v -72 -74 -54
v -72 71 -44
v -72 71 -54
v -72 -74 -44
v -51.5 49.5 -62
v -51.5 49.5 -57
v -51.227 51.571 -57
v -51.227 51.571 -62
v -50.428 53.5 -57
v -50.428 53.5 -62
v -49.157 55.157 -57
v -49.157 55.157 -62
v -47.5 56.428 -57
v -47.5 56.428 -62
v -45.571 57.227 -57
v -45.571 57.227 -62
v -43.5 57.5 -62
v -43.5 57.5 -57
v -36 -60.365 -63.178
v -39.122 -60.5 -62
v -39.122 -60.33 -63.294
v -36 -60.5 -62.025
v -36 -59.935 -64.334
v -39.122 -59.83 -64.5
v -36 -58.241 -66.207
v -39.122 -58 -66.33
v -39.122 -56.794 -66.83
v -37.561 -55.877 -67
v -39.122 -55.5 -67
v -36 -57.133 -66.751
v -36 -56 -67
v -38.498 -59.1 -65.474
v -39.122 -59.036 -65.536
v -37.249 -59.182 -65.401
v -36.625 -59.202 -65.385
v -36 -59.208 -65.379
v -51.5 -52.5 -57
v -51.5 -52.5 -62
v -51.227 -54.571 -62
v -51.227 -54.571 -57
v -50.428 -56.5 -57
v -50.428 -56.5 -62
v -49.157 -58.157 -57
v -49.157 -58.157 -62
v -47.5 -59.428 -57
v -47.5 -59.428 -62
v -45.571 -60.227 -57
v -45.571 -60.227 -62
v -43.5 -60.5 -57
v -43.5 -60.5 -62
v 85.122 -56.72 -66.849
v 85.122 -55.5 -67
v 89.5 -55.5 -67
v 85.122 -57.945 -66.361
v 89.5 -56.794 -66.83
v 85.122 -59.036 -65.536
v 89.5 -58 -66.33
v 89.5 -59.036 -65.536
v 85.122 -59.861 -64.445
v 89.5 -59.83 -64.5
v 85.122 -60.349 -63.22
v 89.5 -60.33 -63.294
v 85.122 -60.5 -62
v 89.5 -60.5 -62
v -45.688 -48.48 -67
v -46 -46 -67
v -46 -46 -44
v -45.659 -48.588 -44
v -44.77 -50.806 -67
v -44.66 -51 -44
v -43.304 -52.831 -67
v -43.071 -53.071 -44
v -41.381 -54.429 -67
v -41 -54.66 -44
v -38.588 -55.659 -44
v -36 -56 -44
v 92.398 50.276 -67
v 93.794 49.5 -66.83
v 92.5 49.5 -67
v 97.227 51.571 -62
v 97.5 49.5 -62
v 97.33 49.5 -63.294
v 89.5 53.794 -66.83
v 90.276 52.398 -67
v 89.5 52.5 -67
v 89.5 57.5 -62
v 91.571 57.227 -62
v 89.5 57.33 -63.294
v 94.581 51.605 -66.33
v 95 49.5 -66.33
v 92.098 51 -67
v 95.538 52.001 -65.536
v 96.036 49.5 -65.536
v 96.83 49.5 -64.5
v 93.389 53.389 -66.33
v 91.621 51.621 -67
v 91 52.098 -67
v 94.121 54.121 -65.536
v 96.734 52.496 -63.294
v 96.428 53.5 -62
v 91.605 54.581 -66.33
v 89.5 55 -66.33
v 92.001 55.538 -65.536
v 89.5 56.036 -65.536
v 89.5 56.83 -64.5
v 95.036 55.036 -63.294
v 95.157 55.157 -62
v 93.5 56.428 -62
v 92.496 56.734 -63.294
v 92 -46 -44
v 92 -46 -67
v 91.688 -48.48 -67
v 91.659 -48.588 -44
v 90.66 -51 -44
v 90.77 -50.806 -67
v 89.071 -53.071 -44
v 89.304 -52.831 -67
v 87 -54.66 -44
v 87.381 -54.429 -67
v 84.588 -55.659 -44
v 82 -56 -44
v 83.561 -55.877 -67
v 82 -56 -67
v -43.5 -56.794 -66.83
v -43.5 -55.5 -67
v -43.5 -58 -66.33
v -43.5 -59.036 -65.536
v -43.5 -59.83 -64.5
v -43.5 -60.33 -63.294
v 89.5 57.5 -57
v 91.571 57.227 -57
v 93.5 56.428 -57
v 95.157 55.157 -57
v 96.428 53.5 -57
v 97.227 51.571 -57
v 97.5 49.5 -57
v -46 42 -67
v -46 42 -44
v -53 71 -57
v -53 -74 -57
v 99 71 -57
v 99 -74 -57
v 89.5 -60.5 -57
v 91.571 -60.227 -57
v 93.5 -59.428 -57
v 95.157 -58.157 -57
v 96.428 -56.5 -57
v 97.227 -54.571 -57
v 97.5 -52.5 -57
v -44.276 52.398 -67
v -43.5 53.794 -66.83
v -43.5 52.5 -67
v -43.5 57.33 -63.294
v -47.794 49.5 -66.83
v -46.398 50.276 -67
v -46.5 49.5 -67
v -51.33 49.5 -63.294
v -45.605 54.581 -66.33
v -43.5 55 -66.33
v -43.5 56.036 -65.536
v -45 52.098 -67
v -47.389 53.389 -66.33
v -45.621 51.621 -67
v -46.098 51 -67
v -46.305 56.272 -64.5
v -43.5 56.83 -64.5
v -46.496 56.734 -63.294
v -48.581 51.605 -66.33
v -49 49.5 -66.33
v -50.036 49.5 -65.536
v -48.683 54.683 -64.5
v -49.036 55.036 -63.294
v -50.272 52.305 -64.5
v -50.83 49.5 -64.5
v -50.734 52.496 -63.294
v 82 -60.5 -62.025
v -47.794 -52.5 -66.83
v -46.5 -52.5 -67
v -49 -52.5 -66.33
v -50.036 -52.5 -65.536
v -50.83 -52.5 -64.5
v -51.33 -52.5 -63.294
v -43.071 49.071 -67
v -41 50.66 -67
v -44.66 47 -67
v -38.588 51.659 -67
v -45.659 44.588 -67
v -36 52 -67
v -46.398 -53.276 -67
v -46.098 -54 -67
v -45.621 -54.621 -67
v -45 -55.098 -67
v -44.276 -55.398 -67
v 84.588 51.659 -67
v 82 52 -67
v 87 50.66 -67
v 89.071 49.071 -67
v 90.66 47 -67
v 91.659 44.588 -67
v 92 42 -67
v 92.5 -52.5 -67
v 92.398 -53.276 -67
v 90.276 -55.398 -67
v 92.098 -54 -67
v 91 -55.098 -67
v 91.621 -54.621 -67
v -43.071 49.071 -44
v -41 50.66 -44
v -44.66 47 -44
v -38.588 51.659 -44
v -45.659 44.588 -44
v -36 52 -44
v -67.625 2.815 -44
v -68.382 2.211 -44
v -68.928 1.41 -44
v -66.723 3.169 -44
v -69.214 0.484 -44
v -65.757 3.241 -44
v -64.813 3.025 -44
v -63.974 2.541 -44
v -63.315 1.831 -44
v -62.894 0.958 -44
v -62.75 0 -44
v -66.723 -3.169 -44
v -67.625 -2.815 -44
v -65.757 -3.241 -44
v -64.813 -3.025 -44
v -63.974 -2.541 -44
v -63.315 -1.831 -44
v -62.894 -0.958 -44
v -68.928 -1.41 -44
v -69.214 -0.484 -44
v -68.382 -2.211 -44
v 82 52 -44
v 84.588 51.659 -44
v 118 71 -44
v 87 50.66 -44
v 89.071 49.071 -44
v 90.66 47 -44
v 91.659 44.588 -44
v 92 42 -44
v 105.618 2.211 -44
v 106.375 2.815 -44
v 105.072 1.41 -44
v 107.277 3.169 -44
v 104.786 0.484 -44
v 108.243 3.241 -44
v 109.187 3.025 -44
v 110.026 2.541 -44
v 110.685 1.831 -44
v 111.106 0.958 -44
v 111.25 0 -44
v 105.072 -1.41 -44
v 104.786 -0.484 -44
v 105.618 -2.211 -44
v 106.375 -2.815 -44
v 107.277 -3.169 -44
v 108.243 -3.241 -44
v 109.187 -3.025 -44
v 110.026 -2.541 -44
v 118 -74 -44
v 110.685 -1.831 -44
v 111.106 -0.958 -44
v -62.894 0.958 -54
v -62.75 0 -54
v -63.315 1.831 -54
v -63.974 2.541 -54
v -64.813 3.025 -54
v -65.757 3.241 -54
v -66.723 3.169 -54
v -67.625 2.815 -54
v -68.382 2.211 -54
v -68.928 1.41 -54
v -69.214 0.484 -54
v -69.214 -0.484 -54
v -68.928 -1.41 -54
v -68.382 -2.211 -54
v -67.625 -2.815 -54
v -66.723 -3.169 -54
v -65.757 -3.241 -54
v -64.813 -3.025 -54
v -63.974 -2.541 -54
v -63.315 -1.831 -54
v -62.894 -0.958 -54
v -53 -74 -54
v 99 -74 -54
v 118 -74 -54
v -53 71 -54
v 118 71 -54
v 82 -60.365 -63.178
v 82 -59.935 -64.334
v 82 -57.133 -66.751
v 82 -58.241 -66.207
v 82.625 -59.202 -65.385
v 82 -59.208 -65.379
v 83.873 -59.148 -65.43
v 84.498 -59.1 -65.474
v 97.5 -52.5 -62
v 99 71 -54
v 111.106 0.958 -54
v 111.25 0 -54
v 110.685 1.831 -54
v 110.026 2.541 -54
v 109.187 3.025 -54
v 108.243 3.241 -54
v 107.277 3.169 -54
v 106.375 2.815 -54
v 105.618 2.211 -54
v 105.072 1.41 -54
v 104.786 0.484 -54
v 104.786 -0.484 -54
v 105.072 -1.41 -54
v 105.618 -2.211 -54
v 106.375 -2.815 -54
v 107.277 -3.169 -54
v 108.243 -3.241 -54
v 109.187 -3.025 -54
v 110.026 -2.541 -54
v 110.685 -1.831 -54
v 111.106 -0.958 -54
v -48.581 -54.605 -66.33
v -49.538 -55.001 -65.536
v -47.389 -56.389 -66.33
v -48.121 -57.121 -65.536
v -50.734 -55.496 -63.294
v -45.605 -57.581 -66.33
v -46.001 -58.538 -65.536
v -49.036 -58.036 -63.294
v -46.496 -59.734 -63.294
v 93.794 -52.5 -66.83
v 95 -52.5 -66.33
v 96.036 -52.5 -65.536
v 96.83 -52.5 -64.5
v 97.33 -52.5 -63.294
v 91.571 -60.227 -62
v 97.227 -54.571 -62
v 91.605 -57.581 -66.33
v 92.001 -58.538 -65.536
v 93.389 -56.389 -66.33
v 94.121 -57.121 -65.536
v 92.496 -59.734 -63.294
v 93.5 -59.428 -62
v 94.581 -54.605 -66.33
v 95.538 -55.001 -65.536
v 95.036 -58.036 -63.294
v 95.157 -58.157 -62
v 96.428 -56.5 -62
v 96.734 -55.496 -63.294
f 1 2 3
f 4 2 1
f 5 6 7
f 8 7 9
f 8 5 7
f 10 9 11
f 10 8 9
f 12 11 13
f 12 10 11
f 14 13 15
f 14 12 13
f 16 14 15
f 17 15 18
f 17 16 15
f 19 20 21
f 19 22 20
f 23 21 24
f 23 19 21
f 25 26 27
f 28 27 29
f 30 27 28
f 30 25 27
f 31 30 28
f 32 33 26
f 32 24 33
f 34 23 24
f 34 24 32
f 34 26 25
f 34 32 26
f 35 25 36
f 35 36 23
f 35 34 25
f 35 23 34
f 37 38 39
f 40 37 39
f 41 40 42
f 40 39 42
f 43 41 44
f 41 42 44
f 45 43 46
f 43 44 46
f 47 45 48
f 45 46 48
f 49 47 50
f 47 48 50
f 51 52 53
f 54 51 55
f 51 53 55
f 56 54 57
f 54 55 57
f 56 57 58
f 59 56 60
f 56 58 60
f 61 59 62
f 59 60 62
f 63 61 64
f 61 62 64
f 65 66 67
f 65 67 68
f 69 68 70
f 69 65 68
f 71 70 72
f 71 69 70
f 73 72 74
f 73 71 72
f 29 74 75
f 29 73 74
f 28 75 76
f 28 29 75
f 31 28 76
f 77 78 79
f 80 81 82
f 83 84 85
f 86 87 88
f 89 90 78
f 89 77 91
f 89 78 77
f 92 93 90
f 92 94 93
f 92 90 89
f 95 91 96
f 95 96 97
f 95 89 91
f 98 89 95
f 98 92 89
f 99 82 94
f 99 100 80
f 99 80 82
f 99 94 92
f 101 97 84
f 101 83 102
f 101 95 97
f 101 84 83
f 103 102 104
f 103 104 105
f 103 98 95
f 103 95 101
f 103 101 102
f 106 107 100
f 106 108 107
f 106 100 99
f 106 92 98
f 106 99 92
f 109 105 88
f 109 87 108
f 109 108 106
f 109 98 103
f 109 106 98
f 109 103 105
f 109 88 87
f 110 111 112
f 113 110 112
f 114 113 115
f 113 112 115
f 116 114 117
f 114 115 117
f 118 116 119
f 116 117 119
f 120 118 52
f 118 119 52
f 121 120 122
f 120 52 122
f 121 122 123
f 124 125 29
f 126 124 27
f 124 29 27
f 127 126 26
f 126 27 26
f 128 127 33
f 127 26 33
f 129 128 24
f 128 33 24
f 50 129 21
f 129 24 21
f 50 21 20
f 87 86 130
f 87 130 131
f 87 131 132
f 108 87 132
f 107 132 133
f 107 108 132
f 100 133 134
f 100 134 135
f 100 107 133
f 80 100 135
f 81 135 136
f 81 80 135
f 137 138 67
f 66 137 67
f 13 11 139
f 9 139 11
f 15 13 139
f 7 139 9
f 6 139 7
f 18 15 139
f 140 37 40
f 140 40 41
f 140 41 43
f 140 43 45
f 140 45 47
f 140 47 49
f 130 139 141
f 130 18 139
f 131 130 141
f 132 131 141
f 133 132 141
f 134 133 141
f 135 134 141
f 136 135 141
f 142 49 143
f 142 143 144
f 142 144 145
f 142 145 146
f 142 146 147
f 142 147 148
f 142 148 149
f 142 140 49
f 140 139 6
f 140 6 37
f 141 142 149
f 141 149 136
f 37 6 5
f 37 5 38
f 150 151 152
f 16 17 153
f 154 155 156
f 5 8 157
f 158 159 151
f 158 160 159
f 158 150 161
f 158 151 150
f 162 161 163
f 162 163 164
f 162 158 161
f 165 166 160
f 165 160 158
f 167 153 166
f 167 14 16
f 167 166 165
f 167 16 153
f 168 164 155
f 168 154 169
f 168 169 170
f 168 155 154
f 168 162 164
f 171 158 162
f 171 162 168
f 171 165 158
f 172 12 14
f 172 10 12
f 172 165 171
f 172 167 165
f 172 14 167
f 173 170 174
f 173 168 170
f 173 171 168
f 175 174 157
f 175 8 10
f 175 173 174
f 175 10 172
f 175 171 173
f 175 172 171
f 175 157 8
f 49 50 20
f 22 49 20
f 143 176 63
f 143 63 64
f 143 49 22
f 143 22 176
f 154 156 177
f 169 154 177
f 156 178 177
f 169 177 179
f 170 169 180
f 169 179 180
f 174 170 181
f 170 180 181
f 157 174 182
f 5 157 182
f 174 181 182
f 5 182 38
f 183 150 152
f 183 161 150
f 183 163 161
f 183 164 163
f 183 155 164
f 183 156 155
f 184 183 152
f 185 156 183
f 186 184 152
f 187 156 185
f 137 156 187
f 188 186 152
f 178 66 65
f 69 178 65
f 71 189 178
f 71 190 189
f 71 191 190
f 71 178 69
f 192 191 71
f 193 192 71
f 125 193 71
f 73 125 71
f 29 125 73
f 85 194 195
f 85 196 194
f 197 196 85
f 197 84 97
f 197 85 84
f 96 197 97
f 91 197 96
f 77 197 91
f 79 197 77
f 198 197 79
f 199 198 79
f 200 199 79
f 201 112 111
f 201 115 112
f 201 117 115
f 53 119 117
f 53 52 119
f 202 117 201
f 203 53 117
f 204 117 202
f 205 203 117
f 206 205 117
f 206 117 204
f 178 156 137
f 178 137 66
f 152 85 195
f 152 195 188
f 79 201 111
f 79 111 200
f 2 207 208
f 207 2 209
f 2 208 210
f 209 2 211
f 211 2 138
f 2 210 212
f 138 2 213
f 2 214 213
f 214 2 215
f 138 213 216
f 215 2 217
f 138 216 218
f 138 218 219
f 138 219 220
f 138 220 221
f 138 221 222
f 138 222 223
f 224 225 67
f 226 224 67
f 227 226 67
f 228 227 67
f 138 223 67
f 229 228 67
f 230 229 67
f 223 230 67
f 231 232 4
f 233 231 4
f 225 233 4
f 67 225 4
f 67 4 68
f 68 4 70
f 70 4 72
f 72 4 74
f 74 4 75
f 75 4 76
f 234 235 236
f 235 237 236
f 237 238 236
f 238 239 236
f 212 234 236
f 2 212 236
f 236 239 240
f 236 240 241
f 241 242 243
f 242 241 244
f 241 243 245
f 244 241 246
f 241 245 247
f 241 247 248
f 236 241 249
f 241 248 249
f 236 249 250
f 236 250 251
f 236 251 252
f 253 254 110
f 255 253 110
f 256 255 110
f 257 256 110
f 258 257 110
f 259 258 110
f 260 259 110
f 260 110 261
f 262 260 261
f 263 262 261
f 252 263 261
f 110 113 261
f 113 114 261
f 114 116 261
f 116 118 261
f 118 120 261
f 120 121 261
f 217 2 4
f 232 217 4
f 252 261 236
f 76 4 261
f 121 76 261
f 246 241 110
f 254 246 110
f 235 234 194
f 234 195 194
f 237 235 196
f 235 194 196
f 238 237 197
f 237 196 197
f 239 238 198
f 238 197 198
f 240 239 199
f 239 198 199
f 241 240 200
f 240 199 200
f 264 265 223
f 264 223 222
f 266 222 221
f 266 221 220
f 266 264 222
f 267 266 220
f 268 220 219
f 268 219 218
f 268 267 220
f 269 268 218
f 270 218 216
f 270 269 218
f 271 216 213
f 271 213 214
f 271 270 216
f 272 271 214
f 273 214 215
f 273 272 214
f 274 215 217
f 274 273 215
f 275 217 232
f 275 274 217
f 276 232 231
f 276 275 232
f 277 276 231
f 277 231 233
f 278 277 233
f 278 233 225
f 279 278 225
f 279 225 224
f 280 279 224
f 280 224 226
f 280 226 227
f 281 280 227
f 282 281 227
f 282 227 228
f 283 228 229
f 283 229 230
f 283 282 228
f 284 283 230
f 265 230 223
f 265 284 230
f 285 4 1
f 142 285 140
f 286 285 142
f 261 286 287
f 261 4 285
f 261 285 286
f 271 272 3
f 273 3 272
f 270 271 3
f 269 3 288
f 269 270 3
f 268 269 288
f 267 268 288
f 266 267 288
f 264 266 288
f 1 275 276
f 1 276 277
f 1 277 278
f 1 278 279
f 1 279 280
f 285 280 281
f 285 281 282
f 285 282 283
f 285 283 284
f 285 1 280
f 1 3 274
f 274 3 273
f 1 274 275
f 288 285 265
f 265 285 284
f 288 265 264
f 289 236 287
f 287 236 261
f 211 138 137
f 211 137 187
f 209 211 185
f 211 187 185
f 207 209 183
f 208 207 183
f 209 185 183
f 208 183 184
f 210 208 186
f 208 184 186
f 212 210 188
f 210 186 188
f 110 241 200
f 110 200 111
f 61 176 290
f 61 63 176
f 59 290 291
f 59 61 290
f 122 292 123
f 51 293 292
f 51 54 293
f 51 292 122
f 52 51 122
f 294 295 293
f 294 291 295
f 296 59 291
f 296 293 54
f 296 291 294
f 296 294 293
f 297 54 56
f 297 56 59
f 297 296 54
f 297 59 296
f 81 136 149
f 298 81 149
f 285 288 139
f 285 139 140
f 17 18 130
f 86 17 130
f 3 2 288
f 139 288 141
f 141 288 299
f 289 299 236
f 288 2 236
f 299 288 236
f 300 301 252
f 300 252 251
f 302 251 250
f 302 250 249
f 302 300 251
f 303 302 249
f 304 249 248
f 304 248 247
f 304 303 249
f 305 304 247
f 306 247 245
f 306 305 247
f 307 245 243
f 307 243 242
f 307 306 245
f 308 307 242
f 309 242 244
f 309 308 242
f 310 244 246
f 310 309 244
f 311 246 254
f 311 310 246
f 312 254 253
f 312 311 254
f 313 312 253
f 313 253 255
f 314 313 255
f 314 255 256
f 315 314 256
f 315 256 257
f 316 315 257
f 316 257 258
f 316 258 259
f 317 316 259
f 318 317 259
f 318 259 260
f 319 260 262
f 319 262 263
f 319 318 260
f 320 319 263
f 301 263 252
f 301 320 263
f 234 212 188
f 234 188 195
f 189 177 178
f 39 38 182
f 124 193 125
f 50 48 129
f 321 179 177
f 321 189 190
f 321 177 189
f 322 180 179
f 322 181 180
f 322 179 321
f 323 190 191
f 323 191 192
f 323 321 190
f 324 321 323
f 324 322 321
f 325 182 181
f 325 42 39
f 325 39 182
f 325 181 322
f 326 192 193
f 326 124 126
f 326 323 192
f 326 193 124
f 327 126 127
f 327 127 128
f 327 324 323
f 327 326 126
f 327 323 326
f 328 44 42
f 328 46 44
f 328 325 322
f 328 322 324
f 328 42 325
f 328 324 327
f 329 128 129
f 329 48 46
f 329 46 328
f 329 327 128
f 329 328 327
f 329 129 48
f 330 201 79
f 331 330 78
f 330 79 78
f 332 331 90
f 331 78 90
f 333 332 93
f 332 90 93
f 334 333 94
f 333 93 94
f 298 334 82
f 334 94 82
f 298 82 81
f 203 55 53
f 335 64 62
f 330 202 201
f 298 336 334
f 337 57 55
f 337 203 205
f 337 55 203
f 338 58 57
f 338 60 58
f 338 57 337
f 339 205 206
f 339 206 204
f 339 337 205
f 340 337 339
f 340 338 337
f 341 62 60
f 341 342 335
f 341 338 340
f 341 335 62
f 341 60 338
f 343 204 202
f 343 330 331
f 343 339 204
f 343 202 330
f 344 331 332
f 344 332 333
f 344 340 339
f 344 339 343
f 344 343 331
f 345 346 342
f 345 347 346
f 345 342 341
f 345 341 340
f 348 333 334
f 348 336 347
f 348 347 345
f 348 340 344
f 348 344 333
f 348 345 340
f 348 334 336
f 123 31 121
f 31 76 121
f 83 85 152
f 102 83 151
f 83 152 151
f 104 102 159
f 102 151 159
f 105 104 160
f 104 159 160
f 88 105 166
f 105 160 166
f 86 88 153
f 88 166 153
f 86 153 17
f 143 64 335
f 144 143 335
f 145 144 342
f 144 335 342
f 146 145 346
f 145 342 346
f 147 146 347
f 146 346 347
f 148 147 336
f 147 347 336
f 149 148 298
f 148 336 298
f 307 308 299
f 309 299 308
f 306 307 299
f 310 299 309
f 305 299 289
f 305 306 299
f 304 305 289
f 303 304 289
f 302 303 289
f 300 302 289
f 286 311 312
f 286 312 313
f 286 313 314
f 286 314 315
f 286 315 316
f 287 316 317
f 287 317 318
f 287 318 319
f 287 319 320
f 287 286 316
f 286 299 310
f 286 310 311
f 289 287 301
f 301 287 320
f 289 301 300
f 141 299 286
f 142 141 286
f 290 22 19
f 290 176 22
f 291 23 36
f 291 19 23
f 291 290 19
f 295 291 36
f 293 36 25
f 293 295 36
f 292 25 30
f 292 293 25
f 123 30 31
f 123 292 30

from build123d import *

# Parameters (mm, degrees)
CYLINDER027_R             = 3.25
CYLINDER027_DEPTH         = 10
ARRAY009_X_COUNT          = 2
ARRAY009_X_PITCH          = 174
BOX051_W                  = 138
BOX051_H                  = 108
BOX051_DEPTH              = 37
BOX049_W                  = 152
BOX049_H                  = 145
BOX049_DEPTH              = 10
BOX048_W                  = 190
BOX048_H                  = 145
BOX048_DEPTH              = 10
BOX050_W                  = 149
BOX050_H                  = 118
BOX050_DEPTH              = 20
FILLET001_R               = 10
FILLET002_R               = 8
FILLET003_R               = 5
FILLET003_PLACEMENT_ANGLE = 180


with BuildPart() as array009:
    # Cylinder027 → Cylinder027 (new body)
    with BuildSketch(Plane(origin=(8, 75, 0), x_dir=(1, 0, 0), z_dir=(0, 0, 1))):
        Circle(CYLINDER027_R)
    extrude(amount=CYLINDER027_DEPTH)

    # Array009 X: Array009 ×2


with BuildPart() as array009_1:
    add(array009.part)
    with Locations(*[(i * ARRAY009_X_PITCH, 0, 0) for i in range(1, ARRAY009_X_COUNT)]):
        add(array009.part)


with BuildPart() as array009_2:
    # Array009 placement: moved
    add(array009_1.part.moved(Location((-74, -75, -54))))


with BuildPart() as cubo038:
    # Box051 → Box051 (new body)
    with BuildSketch(Plane(origin=(26, 19, -4), x_dir=(1, 0, 0), z_dir=(0, 0, 1))):
        with Locations((69, 54)):
            Rectangle(BOX051_W, BOX051_H)
    extrude(amount=BOX051_DEPTH)


with BuildPart() as cubo036:
    # Box049 → Box049 (new body)
    with BuildSketch(Plane(origin=(19, 0, 3), x_dir=(1, 0, 0), z_dir=(0, 0, 1))):
        with Locations((76, 72.5)):
            Rectangle(BOX049_W, BOX049_H)
    extrude(amount=BOX049_DEPTH)


with BuildPart() as cubo035:
    # Box048 → Box048 (new body)
    with BuildSketch(Plane.XY):
        with Locations((95, 72.5)):
            Rectangle(BOX048_W, BOX048_H)
    extrude(amount=BOX048_DEPTH)


with BuildPart() as cubeta_superior001:
    # Box050 → Box050 (new body)
    with BuildSketch(Plane(origin=(20.5, 13.5, 3), x_dir=(1, 0, 0), z_dir=(0, 0, 1))):
        with Locations((74.5, 59)):
            Rectangle(BOX050_W, BOX050_H)
    extrude(amount=BOX050_DEPTH)

    # Fusion026: union Cubo036, Cubo035
    add(cubo036.part)
    add(cubo035.part)

    # Cut035: cut Cubo038
    add(cubo038.part, mode=Mode.SUBTRACT)

    # Fillet001
    fillet001_edges = [cubeta_superior001.edges().sort_by_distance(p)[0] for p in [
        (164, 19, 11.5),
        (26, 19, 11.5),
        (164, 127, 11.5),
        (26, 127, 11.5),
    ]]
    fillet(fillet001_edges, radius=FILLET001_R)

    # Fillet002
    fillet002_edges = [cubeta_superior001.edges().sort_by_distance(p)[0] for p in [
        (20.5, 13.5, 18),
        (20.5, 131.5, 18),
        (169.5, 131.5, 18),
        (169.5, 13.5, 18),
    ]]
    fillet(fillet002_edges, radius=FILLET002_R)

    # Fillet003
    fillet003_edges = [cubeta_superior001.edges().sort_by_distance(p)[0] for p in [
        (20.5, 72.5, 23),
        (22.843146, 15.843146, 23),
        (22.843146, 129.156854, 23),
        (95, 13.5, 23),
        (95, 131.5, 23),
        (167.156854, 15.843146, 23),
        (167.156854, 129.156854, 23),
        (169.5, 72.5, 23),
    ]]
    fillet(fillet003_edges, radius=FILLET003_R)


with BuildPart() as cubeta_superior001_1:
    # Fillet003 placement: moved
    add(cubeta_superior001.part.moved(Location((-72, 71, -44))).rotate(Axis((-72, 71, -44), (1, 0, 0)), FILLET003_PLACEMENT_ANGLE))

    # Cut036: cut Array009
    add(array009_2.part, mode=Mode.SUBTRACT)


solid = cubeta_superior001_1.part
